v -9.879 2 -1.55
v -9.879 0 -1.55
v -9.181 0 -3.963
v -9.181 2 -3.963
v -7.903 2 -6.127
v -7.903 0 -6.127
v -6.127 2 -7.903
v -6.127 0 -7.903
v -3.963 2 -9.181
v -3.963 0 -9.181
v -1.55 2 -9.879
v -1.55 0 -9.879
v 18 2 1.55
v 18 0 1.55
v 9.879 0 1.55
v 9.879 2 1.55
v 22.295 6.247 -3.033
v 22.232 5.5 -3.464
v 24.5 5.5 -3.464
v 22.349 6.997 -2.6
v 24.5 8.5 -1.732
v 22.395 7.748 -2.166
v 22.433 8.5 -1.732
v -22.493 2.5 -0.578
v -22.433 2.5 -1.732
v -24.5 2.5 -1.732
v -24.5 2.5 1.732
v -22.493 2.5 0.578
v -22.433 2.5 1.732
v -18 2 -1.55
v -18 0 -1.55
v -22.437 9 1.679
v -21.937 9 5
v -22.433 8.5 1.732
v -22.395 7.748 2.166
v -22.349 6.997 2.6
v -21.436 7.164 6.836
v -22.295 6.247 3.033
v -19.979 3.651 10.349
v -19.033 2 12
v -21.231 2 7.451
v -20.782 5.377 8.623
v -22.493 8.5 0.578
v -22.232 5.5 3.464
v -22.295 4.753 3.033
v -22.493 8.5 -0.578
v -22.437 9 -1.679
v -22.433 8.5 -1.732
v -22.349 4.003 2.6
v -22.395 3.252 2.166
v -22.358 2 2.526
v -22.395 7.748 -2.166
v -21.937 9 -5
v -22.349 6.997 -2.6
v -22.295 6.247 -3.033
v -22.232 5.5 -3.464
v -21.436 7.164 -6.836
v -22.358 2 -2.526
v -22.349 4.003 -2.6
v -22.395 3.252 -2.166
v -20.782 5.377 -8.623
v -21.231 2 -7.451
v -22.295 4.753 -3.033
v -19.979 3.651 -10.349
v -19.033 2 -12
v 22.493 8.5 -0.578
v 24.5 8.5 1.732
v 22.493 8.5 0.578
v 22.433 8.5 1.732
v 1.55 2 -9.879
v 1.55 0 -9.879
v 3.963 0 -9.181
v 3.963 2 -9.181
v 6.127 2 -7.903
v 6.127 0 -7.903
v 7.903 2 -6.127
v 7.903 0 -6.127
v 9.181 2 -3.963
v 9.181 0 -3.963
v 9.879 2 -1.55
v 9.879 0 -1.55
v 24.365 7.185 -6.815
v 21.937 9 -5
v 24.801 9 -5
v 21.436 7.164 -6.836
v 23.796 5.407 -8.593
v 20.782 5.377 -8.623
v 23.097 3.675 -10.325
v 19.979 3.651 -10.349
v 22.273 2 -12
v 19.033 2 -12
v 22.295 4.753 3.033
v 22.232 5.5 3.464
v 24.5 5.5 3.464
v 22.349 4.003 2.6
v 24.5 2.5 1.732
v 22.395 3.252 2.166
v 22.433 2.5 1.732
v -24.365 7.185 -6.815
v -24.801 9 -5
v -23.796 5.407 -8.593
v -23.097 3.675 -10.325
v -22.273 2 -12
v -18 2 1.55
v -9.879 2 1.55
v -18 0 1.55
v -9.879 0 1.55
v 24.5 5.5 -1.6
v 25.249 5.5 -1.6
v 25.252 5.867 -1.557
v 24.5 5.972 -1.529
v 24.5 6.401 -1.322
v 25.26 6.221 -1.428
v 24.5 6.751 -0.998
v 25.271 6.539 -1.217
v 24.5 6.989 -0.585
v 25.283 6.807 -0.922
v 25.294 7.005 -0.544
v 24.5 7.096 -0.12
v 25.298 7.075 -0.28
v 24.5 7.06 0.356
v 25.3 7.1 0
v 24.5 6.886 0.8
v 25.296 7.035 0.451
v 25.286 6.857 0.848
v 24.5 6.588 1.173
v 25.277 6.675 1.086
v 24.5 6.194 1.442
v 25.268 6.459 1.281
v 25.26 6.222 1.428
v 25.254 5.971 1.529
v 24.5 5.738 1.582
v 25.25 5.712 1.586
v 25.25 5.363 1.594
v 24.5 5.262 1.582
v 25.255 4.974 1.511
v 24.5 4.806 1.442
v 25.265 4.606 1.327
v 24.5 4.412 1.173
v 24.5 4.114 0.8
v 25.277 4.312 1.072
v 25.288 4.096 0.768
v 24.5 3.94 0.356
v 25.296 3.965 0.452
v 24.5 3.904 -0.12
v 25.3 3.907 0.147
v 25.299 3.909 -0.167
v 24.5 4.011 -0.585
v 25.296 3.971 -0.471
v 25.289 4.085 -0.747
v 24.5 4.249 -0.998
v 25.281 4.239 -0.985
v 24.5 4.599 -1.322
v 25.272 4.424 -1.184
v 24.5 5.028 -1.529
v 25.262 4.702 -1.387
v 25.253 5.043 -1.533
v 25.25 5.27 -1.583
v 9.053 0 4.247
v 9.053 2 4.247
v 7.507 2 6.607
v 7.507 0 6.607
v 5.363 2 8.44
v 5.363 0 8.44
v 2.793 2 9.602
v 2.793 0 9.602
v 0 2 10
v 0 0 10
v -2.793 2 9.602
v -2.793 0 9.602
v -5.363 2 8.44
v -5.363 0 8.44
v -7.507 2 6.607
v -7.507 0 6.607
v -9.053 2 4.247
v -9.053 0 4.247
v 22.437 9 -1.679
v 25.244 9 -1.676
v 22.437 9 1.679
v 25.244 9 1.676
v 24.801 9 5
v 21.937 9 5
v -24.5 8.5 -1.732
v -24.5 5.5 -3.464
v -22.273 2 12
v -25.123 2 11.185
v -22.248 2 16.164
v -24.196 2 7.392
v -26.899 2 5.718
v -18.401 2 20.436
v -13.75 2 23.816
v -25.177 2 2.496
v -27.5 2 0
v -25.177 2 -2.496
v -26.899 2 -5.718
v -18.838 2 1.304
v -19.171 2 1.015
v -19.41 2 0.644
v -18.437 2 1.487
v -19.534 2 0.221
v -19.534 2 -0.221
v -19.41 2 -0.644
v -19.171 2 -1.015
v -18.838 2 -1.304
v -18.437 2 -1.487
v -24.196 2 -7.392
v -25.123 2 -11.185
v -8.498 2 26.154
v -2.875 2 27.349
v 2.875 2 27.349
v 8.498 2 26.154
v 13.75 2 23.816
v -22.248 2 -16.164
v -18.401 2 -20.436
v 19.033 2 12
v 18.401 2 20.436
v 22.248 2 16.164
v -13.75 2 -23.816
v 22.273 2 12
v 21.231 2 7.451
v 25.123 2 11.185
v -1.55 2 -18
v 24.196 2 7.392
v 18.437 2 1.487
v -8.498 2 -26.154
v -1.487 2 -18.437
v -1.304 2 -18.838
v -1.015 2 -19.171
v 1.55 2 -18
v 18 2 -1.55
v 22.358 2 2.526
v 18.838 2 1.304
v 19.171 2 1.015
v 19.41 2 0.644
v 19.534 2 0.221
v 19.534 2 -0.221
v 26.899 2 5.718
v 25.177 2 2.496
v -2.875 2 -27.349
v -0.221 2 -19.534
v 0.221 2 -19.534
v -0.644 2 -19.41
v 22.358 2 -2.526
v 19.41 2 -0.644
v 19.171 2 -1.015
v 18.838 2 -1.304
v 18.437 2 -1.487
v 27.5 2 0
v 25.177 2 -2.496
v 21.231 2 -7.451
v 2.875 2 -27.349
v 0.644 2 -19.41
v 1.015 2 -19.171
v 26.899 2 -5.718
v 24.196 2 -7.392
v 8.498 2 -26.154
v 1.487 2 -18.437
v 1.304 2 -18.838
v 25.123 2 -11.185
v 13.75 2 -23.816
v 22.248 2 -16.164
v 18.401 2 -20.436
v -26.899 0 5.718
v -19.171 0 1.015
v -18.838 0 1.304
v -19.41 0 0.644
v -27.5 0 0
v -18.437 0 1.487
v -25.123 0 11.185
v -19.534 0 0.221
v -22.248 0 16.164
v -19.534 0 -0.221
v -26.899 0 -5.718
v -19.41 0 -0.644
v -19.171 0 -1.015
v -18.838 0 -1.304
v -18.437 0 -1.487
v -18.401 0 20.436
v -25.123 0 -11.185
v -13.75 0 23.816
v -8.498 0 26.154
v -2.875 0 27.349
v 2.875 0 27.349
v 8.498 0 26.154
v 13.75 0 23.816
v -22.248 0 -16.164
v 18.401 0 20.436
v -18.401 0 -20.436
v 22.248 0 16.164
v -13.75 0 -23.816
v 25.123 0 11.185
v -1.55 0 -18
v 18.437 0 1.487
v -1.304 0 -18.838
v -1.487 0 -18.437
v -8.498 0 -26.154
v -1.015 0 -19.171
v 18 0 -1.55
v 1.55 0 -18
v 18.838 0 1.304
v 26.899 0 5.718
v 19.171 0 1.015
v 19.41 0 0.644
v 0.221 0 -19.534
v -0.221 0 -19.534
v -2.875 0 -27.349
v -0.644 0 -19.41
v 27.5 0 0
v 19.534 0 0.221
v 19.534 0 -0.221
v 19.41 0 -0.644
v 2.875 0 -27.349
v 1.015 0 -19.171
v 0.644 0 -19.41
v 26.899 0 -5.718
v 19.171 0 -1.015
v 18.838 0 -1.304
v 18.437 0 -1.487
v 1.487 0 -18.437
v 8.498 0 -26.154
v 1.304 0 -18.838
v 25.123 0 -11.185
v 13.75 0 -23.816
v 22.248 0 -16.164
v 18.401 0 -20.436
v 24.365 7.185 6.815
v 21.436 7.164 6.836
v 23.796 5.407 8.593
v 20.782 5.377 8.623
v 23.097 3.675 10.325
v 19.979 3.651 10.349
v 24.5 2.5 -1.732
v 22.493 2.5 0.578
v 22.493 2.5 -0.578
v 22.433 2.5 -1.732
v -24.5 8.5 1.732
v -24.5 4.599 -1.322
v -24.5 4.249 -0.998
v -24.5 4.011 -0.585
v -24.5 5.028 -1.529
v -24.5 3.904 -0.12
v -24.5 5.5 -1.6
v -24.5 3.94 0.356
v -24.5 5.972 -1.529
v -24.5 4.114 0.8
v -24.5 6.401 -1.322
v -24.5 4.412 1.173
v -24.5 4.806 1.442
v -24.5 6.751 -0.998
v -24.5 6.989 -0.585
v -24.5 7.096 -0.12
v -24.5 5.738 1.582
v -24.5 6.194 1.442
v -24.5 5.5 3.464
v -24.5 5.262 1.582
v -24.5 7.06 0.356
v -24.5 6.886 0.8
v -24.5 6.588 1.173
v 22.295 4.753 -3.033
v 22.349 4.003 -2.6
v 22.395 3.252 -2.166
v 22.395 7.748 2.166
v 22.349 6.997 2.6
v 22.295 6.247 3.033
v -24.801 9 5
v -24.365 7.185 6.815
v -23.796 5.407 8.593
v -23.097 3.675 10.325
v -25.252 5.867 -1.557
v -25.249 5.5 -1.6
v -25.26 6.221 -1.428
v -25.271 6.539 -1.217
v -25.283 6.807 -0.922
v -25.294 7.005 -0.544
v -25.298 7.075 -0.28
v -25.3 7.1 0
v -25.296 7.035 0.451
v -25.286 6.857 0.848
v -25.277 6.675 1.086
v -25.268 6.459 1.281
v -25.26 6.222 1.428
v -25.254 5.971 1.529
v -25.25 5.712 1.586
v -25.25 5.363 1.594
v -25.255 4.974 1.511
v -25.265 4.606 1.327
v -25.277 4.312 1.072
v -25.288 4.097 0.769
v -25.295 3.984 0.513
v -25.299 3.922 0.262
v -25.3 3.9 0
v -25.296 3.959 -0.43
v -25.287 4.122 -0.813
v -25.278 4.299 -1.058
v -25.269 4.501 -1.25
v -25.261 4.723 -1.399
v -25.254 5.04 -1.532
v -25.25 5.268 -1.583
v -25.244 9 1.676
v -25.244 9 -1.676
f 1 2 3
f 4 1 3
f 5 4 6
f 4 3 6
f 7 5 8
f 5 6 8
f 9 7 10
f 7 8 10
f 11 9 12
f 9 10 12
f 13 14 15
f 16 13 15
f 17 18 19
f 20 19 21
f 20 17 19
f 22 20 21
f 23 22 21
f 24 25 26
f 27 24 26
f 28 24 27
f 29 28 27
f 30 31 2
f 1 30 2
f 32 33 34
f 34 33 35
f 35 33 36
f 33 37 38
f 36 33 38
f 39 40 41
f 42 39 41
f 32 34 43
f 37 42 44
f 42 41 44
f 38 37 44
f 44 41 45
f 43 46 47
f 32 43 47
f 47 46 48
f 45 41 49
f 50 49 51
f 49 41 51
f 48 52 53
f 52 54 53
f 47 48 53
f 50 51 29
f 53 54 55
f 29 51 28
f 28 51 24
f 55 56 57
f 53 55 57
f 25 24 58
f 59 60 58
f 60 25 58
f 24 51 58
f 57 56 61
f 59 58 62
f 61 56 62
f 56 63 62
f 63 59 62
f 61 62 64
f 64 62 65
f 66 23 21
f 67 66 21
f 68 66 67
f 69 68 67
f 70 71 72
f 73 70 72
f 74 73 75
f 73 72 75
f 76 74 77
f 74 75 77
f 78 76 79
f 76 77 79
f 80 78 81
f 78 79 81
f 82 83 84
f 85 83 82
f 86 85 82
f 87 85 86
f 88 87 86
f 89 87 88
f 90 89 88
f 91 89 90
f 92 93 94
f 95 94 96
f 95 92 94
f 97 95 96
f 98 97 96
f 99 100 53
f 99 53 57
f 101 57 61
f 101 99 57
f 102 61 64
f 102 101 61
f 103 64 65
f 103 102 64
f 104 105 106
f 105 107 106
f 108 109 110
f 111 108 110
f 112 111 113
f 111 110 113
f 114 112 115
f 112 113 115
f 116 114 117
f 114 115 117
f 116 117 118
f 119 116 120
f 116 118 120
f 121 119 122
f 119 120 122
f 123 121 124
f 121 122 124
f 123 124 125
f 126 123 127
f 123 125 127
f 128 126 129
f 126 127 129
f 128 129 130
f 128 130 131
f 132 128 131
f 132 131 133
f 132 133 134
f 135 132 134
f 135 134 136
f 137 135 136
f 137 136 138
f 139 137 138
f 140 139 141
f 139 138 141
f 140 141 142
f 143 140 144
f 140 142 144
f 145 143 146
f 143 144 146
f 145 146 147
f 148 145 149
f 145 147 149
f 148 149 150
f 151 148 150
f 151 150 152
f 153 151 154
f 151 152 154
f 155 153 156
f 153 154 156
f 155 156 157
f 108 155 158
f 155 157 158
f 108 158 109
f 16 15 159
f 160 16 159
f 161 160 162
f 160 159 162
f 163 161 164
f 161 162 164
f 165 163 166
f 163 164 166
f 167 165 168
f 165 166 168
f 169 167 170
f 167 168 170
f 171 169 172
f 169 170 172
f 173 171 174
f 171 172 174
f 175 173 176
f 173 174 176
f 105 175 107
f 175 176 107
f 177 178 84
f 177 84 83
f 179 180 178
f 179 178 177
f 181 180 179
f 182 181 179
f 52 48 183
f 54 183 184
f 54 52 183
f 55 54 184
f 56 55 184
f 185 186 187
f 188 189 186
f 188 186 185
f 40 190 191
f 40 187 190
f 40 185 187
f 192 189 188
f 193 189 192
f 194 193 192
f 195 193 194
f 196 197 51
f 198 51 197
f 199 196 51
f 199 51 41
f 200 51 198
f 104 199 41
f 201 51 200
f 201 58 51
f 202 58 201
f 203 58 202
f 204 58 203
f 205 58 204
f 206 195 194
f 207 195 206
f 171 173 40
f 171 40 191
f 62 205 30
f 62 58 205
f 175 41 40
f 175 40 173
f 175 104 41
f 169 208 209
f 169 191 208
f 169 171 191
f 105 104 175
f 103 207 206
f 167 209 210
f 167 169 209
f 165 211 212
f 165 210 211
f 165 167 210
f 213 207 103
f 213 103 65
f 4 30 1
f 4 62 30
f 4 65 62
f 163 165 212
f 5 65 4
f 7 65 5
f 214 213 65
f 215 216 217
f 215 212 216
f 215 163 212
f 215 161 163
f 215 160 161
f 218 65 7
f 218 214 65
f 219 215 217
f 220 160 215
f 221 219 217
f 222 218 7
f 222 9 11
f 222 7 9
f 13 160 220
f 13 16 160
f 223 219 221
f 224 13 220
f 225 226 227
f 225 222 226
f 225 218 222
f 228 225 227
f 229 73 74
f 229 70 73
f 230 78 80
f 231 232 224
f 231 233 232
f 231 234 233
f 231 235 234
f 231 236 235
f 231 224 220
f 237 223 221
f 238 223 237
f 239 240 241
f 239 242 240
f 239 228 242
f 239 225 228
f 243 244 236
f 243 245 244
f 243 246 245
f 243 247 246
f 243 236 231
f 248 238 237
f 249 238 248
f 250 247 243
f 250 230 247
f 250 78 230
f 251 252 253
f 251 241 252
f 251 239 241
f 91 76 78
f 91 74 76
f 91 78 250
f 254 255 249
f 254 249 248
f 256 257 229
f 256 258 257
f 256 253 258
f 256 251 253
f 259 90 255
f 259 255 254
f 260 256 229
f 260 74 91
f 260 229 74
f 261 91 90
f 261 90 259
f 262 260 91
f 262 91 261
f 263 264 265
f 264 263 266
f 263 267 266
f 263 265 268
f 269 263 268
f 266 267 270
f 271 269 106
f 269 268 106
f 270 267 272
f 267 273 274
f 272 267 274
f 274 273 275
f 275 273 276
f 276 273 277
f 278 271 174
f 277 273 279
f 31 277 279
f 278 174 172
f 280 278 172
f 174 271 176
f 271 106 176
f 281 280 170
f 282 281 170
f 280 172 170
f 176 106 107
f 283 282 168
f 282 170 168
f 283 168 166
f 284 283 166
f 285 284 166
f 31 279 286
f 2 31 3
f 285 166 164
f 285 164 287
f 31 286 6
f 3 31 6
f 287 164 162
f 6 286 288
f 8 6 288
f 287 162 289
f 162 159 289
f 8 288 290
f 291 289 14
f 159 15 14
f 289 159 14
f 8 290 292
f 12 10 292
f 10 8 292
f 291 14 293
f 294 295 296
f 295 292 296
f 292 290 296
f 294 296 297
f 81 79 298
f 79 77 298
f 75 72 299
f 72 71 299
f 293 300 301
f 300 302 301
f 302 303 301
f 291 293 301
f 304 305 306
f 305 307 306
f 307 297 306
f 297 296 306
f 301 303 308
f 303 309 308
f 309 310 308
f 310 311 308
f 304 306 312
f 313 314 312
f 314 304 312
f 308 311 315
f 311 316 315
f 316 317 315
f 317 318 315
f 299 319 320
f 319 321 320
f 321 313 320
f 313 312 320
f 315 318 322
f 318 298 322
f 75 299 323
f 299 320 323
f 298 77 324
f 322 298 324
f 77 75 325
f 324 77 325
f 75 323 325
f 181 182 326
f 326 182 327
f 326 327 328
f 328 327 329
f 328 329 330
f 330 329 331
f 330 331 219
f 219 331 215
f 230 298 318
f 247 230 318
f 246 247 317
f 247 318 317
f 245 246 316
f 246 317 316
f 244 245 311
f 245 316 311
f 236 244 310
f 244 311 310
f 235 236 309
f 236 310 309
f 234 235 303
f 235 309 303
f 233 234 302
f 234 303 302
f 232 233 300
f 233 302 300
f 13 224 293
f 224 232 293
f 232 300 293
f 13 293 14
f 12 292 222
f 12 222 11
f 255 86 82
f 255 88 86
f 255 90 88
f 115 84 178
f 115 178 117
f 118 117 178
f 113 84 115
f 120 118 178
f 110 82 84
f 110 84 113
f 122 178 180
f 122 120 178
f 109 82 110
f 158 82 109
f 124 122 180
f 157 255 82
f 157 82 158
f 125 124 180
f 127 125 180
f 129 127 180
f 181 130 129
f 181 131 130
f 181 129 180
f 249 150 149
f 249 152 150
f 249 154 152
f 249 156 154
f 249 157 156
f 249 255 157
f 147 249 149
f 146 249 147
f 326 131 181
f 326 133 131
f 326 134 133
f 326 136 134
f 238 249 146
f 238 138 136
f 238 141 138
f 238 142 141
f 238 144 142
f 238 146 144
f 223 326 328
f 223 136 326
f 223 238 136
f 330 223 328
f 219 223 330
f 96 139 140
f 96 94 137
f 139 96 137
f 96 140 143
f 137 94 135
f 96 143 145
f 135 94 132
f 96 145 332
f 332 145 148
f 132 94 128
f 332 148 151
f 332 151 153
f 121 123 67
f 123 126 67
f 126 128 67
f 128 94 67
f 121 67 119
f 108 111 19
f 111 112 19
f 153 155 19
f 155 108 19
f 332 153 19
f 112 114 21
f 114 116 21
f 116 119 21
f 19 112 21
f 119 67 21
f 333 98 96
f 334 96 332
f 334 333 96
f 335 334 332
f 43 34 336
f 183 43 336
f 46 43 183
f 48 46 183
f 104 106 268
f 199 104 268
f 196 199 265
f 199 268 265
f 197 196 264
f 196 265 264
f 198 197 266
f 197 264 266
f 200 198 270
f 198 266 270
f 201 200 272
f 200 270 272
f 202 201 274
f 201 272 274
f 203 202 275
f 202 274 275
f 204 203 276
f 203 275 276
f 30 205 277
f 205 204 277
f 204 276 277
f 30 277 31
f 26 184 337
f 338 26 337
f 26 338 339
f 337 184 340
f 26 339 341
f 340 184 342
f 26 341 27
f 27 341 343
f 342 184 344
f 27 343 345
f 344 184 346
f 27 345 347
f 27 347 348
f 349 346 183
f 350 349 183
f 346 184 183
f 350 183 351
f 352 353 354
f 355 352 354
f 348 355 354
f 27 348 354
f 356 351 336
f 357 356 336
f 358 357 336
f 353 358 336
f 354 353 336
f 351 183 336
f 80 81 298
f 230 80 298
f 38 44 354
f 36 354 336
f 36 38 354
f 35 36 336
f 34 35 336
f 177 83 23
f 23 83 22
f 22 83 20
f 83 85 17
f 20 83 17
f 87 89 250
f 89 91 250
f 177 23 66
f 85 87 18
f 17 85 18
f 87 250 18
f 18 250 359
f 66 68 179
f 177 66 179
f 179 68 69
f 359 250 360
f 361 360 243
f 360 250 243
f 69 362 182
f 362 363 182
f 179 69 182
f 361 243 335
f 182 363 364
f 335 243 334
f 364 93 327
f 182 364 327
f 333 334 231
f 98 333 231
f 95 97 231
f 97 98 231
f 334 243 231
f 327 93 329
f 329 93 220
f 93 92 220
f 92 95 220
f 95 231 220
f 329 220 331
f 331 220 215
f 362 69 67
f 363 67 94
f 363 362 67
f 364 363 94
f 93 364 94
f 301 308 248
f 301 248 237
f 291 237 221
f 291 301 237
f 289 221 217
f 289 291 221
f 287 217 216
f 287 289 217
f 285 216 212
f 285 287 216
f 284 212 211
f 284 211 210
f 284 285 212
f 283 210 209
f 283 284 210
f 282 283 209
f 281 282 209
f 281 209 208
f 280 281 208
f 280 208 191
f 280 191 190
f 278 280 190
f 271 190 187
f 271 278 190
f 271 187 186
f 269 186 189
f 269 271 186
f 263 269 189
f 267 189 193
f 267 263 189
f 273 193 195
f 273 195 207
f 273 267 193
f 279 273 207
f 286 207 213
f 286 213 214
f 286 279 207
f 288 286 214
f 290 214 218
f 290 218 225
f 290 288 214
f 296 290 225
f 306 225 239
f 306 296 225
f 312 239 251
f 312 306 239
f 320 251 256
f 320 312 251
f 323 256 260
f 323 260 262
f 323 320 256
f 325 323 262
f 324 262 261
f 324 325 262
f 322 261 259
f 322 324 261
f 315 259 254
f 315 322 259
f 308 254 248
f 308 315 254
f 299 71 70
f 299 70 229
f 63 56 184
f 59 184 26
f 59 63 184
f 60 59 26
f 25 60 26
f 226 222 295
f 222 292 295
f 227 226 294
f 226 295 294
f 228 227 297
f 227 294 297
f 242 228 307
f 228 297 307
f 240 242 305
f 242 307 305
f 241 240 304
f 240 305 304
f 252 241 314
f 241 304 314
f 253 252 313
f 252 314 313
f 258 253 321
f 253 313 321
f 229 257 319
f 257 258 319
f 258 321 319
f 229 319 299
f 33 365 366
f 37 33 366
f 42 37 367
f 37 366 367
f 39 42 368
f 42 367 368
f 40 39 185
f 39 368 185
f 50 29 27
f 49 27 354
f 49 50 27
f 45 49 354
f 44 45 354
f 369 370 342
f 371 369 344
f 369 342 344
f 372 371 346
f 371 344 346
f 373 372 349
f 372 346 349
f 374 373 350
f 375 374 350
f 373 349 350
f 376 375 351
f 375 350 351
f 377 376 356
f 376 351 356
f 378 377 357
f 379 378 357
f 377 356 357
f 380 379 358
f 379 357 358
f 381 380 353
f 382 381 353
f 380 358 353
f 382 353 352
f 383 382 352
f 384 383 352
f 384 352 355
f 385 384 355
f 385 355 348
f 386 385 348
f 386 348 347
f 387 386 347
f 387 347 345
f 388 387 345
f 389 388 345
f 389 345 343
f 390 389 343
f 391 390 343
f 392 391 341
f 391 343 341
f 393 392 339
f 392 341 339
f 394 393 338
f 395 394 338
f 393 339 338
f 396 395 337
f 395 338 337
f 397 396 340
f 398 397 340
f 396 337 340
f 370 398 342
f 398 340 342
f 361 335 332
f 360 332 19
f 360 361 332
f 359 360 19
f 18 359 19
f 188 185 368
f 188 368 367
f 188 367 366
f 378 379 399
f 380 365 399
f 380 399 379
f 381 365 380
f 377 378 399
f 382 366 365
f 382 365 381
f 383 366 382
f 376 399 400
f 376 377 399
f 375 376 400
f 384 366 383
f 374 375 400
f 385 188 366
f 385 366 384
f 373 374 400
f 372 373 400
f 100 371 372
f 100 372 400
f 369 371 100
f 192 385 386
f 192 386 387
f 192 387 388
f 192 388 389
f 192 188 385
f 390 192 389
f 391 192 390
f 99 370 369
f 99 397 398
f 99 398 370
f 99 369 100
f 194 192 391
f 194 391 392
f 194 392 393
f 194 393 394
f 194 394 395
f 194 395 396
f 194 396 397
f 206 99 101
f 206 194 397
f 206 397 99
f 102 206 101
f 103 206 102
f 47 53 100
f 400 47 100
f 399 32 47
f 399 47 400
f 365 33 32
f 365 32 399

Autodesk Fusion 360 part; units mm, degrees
sketch "Sketch1" plane through (0, 0, 0) normal (0, 1, 0) x (1, 0, 0)
  circle A0 centre (0, 0) radius 27.5
  circle A1 centre (0, 0) radius 10
  line L0 (0, 0) -> (13, 0)
  line L1 (0, 0) -> (0, 13)
  line L2 (0, 0) -> (-13, 0)
  line L3 (-13, 0) -> (-13, 1.55)
  line L4 (-13, 1.55) -> (-18, 1.55)
  line L5 (-13, 1.55) -> (-9.8791, 1.55)
  line L6 (-13, 0) -> (-13, -1.55)
  line L7 (-13, -1.55) -> (-9.8791, -1.55)
  line L8 (-13, -1.55) -> (-18, -1.55)
  line L9 (0, 13) -> (1.55, 13)
  line L10 (1.55, 13) -> (1.55, 18)
  line L11 (1.55, 18) -> (-1.55, 18)
  line L12 (-1.55, 18) -> (-1.55, 9.8791)
  line L13 (1.55, 9.8791) -> (1.55, 18)
  line L14 (13, 0) -> (13, -1.55)
  line L15 (13, -1.55) -> (18, -1.55)
  line L16 (18, -1.55) -> (9.8791, -1.55)
  line L17 (9.8791, 1.55) -> (18, 1.55)
  line L18 (18, 1.55) -> (18, -1.55)
  arc A2 (-18, 1.55) -> (-18, -1.55) centre (-18, 0) ccw
  arc A3 (1.55, 18) -> (-1.55, 18) centre (0, 18) ccw
  arc A4 (18, -1.55) -> (18, 1.55) centre (18, 0) ccw
  dimension "d12" = 13
  dimension "d13" = 13
  dimension "d14" = 13
  dimension "d15" = 1.55
  dimension "d16" = 5
  dimension "d17" = 1.55
  dimension "d18" = 1.55
  dimension "d19" = 5
  dimension "d20" = 3.1
  dimension "d21" = 1.55
  dimension "d22" = 5
  dimension "d23" = 3.1
extrude "Extrude1" add sketch "Sketch1" along normal blind 2
sketch "Sketch2" plane through (0, 2, 0) normal (0, 1, 0) x (-1, 0, 0)
  line L0 (-18, 1.55) -> (-9.8791, 1.55)
  arc A0 (9.8791, 1.55) -> (-9.8791, 1.55) centre (0, 0) ccw
  line L1 (9.8791, 1.55) -> (18, 1.55)
  arc A1 (18, -1.55) -> (18, 1.55) centre (18, 0) ccw
  line L2 (18, -1.55) -> (9.8791, -1.55)
  arc A2 (1.55, -9.8791) -> (9.8791, -1.55) centre (0, 0) ccw
  line L3 (1.55, -9.8791) -> (1.55, -18)
  arc A3 (-1.55, -18) -> (1.55, -18) centre (0, -18) ccw
  line L4 (-1.55, -18) -> (-1.55, -9.8791)
  arc A4 (-9.8791, -1.55) -> (-1.55, -9.8791) centre (0, 0) ccw
  line L5 (-9.8791, -1.55) -> (-18, -1.55)
  arc A5 (-18, 1.55) -> (-18, -1.55) centre (-18, 0) ccw
  circle A6 centre (0, 0) radius 27.5
  circle A7 centre (0, 0) radius 25.3
  circle A8 centre (0, 0) radius 22.5
  dimension "d26" = 50.6
  dimension "d27" = 45
extrude "Extrude2" add sketch "Sketch2" along normal blind 7 contours A7
ref_plane "WorkPlane2" through (25.5, 0, 0) normal (1, 0, 0) x (0, 1, 0)
sketch "Sketch4" plane through (25.5, 0, 0) normal (1, 0, 0) x (0, 0, -1)
  line L0 (0, 9) -> (0, 5.5)
  circle A0 centre (0, 5.5) radius 1.6
  point P0 (0, 9)
  dimension "d35" = 3.5
  dimension "d36" = 3.2
extrude "Extrude4" cut sketch "Sketch4" against normal through all
ref_plane "WorkPlane3" through (22.5, 0, 0) normal (1, 0, 0) x (0, 1, 0)
sketch "Sketch5" plane through (22.5, 0, 0) normal (1, 0, 0) x (0, 0, -1)
  line L0 (-1.7321, 8.5) -> (-3.4641, 5.5)
  line L1 (-3.4641, 5.5) -> (-1.7321, 2.5)
  line L2 (-1.7321, 2.5) -> (1.7321, 2.5)
  line L3 (1.7321, 2.5) -> (3.4641, 5.5)
  line L4 (3.4641, 5.5) -> (1.7321, 8.5)
  line L5 (1.7321, 8.5) -> (-1.7321, 8.5)
  point P0 (0, 5.5)
extrude "Extrude5" cut sketch "Sketch5" along normal blind 2 and the other way blind 1
pattern_circular "C-Pattern1" count 2 over 360 about axis through (0, 1.75, 0) along (0, 1, 0) of "Extrude5"
sketch "Sketch6" plane through (0, 0, 0) normal (1, 0, 0) x (0, 0, -1)
  line L0 (0, 9) -> (-2, 9)
  line L1 (1.55, 2) -> (9.8791, 2)
  line L2 (27.5, 2) -> (-27.5, 2)
  line L3 (28, 9) -> (28, 2)
  line L4 (28, 2) -> (-25.7716, 2)
  line L5 (-25.7716, 2) -> (-25.7716, 9)
  line L6 (0, 9) -> (-5, 9)
  line L7 (0, 9) -> (5, 9)
  line L8 (5, 9) -> (12, 2)
  line L9 (5, 9) -> (14.8995, 9) construction
  line L10 (-5, 9) -> (-12, 2)
  line L11 (28, 9) -> (-26, 9)
  point P0 (0, 9)
  dimension "d46" = 2
  dimension "d52" = 5
  dimension "d53" = 5
  dimension "d54" = 45
extrude "Extrude8" cut sketch "Sketch6" along normal mid plane 57.44 contours L2 L3 L4 L8 L11 | L2 L4 L5 L10 L11
